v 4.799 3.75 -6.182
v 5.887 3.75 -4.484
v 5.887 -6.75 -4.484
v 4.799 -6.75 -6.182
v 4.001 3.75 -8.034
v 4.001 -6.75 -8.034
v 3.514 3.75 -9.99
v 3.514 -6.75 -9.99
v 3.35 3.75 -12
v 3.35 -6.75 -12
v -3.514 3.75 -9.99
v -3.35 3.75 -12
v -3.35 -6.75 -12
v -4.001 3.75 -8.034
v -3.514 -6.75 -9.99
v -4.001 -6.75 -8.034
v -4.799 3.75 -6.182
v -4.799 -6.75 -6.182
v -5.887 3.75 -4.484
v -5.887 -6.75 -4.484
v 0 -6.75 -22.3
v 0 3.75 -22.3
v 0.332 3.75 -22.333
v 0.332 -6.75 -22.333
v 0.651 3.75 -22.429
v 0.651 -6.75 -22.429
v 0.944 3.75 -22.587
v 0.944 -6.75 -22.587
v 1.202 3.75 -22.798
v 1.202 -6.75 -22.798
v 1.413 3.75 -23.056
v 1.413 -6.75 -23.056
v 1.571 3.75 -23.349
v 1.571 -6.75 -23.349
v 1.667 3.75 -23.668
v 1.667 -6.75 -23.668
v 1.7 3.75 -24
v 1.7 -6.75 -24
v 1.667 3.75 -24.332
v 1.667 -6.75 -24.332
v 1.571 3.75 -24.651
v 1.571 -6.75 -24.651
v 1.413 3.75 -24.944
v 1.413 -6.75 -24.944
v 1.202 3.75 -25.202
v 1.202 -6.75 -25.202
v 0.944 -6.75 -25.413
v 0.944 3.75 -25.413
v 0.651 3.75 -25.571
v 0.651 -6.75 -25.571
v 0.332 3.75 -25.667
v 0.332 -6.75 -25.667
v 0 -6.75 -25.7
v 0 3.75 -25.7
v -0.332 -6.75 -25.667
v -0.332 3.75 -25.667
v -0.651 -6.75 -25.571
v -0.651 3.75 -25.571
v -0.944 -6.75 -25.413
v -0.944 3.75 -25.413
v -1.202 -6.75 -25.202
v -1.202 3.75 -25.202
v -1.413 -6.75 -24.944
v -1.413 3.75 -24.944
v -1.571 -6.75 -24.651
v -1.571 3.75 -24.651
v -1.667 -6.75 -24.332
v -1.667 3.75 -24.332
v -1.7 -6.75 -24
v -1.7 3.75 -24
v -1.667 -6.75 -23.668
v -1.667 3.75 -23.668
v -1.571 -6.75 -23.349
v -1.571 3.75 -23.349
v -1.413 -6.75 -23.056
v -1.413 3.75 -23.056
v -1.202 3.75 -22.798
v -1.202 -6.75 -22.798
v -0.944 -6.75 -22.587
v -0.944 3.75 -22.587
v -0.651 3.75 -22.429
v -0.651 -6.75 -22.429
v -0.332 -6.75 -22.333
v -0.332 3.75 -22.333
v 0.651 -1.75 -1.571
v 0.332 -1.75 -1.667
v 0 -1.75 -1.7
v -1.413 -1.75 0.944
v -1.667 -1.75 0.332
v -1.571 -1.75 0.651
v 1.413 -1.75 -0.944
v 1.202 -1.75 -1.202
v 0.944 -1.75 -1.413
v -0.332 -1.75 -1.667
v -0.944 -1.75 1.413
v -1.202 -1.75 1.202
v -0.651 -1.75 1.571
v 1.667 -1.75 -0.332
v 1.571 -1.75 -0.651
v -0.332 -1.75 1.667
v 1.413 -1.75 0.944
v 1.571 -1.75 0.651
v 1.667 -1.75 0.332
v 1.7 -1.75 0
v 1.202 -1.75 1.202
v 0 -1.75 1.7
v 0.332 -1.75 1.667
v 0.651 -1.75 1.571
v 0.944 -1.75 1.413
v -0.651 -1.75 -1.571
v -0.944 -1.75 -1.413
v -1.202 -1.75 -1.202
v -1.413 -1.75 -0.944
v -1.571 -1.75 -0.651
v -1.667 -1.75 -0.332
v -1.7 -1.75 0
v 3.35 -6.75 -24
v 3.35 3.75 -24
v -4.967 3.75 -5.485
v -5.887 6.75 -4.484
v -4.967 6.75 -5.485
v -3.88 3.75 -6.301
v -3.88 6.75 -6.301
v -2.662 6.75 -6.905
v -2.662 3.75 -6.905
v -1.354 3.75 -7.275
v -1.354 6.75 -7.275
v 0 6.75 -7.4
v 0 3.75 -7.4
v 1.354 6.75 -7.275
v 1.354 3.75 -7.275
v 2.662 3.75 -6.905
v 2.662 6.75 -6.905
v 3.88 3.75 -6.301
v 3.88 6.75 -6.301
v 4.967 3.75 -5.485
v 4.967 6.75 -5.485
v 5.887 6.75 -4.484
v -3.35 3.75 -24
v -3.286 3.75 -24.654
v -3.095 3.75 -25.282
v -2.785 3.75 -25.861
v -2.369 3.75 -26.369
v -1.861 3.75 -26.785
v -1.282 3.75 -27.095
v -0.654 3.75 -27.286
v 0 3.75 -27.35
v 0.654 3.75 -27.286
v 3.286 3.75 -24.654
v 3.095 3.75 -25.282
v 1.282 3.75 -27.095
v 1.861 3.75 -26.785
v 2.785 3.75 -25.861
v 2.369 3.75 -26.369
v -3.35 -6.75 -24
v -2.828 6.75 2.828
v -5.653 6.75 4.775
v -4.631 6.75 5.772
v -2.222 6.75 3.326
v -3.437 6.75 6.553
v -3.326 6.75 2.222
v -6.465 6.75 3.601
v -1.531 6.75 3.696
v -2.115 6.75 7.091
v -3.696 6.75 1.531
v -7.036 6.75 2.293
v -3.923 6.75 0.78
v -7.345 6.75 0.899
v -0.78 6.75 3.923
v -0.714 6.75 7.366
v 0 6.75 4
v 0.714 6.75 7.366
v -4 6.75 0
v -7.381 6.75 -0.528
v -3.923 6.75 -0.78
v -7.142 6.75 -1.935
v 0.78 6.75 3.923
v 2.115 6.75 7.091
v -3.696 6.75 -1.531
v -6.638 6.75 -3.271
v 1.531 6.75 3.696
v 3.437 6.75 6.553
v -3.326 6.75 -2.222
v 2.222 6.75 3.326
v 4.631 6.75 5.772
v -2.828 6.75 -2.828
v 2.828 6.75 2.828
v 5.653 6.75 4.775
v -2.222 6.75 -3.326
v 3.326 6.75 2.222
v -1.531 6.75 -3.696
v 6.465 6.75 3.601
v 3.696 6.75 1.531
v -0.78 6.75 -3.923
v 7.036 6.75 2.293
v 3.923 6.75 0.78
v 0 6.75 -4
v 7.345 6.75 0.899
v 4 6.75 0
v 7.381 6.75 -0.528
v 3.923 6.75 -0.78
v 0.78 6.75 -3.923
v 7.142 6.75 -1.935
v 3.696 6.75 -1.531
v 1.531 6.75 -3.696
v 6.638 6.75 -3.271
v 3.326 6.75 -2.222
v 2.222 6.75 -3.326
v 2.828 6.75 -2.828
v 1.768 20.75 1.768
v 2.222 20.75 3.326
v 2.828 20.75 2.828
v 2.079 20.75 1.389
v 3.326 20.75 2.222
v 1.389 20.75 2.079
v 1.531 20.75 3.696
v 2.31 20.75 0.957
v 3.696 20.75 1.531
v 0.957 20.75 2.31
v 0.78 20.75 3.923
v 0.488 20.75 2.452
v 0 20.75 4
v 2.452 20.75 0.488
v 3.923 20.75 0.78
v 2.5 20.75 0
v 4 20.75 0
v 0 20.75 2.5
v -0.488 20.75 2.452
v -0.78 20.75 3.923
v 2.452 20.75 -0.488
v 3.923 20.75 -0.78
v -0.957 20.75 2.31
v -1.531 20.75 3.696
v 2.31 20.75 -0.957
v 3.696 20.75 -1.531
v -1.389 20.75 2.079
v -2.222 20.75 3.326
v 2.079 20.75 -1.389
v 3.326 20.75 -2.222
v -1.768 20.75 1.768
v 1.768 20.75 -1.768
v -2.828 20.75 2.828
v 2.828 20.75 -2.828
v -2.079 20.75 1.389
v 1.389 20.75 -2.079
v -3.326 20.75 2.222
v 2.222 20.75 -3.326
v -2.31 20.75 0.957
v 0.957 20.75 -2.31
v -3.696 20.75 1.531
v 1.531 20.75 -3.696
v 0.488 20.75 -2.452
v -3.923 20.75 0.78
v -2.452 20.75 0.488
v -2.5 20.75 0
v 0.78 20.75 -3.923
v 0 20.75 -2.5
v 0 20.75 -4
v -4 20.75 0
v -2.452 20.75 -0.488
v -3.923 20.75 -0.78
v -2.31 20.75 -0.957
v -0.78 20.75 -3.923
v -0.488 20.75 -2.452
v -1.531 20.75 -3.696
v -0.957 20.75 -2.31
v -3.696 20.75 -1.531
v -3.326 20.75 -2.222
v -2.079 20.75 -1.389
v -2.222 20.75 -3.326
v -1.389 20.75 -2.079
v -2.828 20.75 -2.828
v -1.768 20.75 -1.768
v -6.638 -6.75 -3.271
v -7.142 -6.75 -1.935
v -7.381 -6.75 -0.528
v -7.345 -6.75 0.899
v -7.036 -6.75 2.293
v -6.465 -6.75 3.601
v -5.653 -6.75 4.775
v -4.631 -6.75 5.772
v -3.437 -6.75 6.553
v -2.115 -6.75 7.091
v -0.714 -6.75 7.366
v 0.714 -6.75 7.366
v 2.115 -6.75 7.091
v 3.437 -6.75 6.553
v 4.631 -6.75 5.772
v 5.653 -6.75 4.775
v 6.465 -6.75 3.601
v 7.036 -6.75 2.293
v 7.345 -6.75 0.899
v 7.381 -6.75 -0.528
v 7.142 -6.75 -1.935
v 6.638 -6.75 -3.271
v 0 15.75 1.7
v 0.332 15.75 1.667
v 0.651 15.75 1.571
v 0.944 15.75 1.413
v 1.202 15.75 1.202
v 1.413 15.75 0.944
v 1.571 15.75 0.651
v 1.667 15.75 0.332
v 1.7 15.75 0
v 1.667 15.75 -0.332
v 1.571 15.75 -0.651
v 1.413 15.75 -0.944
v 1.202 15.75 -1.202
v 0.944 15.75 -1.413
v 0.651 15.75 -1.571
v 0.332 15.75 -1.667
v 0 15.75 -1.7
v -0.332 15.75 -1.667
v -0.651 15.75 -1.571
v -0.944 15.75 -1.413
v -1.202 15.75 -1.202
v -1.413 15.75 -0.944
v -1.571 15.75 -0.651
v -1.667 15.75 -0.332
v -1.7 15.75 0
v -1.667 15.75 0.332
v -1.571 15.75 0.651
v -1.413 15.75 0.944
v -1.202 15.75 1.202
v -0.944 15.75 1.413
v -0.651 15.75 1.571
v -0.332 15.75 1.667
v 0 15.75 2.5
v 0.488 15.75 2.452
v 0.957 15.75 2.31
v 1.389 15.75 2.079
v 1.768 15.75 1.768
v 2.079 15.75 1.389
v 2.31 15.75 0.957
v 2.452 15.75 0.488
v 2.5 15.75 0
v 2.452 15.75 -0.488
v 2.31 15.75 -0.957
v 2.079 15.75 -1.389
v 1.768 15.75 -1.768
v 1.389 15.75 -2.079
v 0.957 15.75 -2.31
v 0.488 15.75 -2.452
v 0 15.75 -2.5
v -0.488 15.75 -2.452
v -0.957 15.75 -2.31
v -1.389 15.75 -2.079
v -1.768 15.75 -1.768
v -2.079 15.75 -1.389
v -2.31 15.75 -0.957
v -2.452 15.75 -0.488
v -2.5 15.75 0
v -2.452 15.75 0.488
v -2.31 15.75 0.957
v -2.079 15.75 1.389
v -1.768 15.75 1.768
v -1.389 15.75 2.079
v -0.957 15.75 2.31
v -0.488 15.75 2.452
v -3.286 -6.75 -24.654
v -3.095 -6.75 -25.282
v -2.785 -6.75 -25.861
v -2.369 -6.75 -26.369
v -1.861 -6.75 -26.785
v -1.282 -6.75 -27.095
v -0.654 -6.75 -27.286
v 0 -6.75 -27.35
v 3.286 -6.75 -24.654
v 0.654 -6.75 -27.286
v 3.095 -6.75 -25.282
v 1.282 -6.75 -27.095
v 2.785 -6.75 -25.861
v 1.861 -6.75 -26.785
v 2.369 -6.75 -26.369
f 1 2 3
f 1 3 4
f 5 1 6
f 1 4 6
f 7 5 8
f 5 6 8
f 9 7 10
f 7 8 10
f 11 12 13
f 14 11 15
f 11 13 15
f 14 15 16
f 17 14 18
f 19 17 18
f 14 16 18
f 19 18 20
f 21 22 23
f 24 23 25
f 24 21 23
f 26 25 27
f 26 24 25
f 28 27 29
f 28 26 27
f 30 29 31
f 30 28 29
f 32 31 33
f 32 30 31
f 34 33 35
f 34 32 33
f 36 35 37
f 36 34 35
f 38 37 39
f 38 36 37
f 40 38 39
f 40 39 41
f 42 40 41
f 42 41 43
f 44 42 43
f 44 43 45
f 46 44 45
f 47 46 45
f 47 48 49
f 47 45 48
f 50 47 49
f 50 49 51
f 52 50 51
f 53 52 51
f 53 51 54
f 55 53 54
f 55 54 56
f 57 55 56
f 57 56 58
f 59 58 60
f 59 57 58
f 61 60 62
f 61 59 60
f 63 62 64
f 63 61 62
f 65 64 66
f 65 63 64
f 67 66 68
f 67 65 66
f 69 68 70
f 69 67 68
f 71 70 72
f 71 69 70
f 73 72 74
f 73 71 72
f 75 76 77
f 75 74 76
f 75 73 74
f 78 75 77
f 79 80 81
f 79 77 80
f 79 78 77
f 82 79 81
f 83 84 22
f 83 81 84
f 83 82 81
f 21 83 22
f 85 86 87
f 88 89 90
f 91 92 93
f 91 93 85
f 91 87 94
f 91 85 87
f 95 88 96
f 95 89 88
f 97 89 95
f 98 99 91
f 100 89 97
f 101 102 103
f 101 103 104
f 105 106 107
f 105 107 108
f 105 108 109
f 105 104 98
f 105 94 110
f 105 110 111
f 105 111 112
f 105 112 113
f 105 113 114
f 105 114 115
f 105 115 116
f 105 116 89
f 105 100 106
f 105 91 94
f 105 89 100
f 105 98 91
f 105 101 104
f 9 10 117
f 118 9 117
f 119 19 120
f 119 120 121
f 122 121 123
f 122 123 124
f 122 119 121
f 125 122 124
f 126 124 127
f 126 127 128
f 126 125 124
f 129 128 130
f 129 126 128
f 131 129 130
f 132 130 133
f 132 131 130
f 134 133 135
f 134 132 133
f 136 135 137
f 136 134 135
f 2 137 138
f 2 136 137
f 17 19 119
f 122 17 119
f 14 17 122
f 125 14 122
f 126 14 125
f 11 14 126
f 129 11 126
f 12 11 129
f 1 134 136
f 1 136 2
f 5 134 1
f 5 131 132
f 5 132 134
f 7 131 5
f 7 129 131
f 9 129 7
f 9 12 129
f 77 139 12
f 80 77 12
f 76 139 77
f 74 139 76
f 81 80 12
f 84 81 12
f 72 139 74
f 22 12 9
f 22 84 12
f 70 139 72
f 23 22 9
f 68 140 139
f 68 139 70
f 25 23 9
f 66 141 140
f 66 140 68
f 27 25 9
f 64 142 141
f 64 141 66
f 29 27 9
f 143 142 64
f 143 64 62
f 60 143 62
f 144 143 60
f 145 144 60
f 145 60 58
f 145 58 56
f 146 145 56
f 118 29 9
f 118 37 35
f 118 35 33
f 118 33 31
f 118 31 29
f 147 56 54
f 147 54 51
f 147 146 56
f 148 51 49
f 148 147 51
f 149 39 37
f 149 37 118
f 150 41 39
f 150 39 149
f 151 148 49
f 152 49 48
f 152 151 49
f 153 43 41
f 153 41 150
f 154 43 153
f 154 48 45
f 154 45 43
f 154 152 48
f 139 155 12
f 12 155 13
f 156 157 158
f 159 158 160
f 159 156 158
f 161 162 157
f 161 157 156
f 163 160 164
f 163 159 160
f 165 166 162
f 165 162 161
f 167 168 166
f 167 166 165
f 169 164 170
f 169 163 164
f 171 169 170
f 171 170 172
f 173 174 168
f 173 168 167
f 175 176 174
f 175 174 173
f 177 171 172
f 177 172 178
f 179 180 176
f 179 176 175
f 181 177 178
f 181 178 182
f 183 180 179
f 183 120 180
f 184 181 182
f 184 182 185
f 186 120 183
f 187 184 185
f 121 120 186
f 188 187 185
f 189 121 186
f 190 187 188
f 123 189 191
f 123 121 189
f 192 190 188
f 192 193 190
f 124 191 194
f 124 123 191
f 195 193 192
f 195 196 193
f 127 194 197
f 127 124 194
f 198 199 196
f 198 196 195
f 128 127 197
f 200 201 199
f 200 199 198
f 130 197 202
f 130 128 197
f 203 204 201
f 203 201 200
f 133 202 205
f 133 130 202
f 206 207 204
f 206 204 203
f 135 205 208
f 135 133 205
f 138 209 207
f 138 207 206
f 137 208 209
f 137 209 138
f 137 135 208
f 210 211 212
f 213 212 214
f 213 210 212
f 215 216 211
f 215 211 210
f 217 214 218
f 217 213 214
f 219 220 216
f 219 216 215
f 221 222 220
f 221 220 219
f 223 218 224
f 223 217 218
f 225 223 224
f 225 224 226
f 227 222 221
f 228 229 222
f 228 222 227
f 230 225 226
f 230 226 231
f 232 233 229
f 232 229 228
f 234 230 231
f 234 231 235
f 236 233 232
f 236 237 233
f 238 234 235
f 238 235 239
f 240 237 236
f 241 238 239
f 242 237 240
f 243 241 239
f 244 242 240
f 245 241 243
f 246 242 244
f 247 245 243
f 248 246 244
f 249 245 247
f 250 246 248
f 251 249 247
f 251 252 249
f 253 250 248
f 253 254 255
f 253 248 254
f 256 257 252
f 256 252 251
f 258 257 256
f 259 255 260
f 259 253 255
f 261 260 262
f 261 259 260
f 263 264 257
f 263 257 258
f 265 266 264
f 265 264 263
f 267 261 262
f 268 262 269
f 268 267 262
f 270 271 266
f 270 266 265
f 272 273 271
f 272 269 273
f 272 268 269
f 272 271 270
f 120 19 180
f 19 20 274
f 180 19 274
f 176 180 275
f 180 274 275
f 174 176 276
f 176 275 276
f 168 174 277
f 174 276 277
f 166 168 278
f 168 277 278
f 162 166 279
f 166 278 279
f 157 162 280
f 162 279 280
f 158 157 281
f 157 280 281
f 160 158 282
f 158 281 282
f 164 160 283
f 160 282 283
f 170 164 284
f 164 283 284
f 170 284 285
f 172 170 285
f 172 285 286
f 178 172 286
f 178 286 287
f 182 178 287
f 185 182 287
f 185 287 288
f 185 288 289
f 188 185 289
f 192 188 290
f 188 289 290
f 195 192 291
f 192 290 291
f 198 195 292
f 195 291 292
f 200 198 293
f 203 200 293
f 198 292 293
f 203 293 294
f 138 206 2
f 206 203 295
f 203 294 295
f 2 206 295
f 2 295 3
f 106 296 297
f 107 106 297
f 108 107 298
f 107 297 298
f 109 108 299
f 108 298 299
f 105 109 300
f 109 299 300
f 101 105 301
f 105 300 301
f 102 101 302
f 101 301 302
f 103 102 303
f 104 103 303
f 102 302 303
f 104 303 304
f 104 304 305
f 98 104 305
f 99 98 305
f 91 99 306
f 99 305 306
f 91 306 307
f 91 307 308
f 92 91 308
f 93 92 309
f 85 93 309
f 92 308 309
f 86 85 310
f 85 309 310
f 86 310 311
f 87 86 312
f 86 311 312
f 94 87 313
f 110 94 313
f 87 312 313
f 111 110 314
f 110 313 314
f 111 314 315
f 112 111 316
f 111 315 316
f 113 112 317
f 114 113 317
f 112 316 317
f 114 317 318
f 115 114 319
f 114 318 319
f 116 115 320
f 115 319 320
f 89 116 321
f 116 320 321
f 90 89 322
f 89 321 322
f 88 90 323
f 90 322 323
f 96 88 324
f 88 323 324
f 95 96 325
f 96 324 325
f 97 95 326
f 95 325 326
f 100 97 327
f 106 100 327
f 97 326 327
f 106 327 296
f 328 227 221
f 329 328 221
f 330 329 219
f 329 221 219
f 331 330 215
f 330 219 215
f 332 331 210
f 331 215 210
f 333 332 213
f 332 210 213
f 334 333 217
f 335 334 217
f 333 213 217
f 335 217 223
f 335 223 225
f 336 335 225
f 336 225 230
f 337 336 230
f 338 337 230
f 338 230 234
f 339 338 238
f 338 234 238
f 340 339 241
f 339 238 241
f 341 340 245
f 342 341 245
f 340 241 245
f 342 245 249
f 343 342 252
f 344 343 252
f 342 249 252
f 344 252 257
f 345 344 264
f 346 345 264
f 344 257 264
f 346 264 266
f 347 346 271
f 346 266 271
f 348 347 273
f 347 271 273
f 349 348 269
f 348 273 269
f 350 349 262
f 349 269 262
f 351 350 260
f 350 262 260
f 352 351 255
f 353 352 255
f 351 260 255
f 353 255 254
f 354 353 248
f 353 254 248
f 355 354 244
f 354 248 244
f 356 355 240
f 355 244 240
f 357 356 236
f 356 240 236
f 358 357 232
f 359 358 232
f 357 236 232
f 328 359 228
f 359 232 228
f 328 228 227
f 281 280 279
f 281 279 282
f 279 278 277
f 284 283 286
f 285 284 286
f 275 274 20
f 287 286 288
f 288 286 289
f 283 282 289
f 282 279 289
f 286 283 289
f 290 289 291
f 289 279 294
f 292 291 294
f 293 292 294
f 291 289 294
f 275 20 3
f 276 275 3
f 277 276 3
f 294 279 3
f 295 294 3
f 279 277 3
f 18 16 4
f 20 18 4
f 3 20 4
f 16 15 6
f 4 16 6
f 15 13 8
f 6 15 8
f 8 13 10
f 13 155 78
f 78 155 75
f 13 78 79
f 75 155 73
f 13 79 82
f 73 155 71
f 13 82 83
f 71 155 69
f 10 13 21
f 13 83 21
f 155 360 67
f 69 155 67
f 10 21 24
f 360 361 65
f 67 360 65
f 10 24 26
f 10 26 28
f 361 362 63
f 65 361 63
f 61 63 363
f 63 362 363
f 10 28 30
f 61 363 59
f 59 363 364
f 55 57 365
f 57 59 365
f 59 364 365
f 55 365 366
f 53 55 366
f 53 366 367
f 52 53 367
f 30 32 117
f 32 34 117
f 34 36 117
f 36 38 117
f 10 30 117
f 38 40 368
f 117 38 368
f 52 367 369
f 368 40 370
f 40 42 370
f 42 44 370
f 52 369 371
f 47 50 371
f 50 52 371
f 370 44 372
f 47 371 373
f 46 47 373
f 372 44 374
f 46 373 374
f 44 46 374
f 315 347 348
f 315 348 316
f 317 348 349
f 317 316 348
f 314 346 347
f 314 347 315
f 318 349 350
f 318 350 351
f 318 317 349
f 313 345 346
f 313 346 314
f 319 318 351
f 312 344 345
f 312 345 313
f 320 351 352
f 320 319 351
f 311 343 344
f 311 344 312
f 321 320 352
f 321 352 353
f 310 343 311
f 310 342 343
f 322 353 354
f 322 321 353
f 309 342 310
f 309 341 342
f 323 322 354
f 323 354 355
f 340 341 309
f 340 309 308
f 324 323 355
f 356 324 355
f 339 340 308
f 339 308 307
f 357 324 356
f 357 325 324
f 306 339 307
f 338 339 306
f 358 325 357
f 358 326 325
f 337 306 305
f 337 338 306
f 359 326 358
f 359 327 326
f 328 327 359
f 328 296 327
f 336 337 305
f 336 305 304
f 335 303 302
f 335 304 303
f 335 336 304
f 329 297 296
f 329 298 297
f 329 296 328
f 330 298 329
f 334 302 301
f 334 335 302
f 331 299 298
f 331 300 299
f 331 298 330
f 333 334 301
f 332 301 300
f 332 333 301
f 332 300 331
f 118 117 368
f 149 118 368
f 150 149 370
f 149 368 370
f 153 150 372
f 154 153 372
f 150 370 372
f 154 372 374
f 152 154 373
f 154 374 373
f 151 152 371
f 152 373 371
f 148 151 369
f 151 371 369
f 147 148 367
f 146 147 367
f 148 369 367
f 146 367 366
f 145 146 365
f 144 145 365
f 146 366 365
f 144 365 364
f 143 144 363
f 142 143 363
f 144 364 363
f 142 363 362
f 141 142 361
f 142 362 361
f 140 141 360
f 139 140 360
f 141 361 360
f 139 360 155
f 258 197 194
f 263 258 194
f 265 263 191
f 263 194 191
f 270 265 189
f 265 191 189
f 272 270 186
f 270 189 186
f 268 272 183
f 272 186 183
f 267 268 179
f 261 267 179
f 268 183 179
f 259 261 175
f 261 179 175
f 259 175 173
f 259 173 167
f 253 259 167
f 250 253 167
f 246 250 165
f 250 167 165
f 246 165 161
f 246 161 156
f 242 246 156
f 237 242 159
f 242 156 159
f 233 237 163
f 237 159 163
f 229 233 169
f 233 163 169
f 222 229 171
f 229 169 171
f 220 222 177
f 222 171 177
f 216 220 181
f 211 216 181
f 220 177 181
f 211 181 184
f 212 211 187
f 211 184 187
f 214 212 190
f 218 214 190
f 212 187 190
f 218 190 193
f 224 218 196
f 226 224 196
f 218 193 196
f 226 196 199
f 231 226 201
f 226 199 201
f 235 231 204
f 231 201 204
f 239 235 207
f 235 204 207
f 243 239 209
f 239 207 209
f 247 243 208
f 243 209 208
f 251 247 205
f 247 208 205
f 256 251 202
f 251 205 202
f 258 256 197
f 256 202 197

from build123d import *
from build123d.topology import SkipClean

# Parameters (mm, degrees)
BOSS_EXTRUDE1_DEPTH      = 6.75
BOSS_EXTRUDE1_DEPTH_BACK = 6.75
SKETCH1_R                = 1.7
SKETCH2_R                = 4
BOSS_EXTRUDE2_DEPTH      = 14
SKETCH3_R                = 2.5
CUT_EXTRUDE1_DEPTH       = 5
SKETCH4_R                = 1.7
CUT_EXTRUDE2_DEPTH       = 17.5
CUT_EXTRUDE4_START       = -3
CUT_EXTRUDE4_DEPTH       = 3


with BuildPart() as part:
    # Sketch1 → Boss-Extrude1 (new, two sides: drawn at the far end of the back side and taken through both)
    with BuildSketch(Plane(origin=(0, 0, 0), x_dir=(1, 0, 0), z_dir=(0, 1, 0)).offset(-BOSS_EXTRUDE1_DEPTH_BACK)):
        with BuildLine():
            Line((-3.35, 24), (-3.35, 12))
            ThreePointArc((-3.35, 12), (-4.001241595, 8.033856538), (-5.886575957, 4.484219386))
            ThreePointArc((-5.886575957, 4.484219386), (0, -7.4), (5.886575957, 4.484219386))
            ThreePointArc((5.886575957, 4.484219386), (4.001241595, 8.033856538), (3.35, 12))
            Line((3.35, 12), (3.35, 24))
            ThreePointArc((3.35, 24), (0, 27.35), (-3.35, 24))
        make_face()
        with Locations(Location((0, 24, 0), (0, 0, 270))):
            Circle(SKETCH1_R, mode=Mode.SUBTRACT)
    extrude(amount=BOSS_EXTRUDE1_DEPTH + BOSS_EXTRUDE1_DEPTH_BACK)

    # Sketch2 → Boss-Extrude2 (add)
    with BuildSketch(Plane(origin=(0, 6.75, 0), x_dir=(1, 0, 0), z_dir=(0, 1, 0))):
        with Locations(Location((0, 0, 0), (0, 0, 90))):
            Circle(SKETCH2_R)
    extrude(amount=BOSS_EXTRUDE2_DEPTH)

    # Sketch3 → Cut-Extrude1 (cut)
    with BuildSketch(Plane(origin=(0, 20.75, 0), x_dir=(1, 0, 0), z_dir=(0, 1, 0))):
        with Locations(Location((0, 0, 0), (0, 0, 270))):
            Circle(SKETCH3_R)
    extrude(amount=-CUT_EXTRUDE1_DEPTH, mode=Mode.SUBTRACT)

    # Sketch4 → Cut-Extrude2 (cut)
    with BuildSketch(Plane(origin=(0, 15.75, 0), x_dir=(1, 0, 0), z_dir=(0, 1, 0))):
        with Locations(Location((0, 0, 0), (0, 0, 270))):
            Circle(SKETCH4_R)
    extrude(amount=-CUT_EXTRUDE2_DEPTH, mode=Mode.SUBTRACT)

    # Sketch5 → Cut-Extrude4 (cut)
    with SkipClean():  # the faces are left unmerged after this step: merging them gives an invalid solid
        with BuildSketch(Plane(origin=(0, 6.75, 0), x_dir=(1, 0, 0), z_dir=(0, 1, 0)).offset(CUT_EXTRUDE4_START)):
            with BuildLine():
                Line((3.35, 12), (3.35, 24))
                ThreePointArc((3.35, 24), (0, 27.35), (-3.35, 24))
                Line((-3.35, 24), (-3.35, 12))
                ThreePointArc((-3.35, 12), (-4.001241595, 8.033856538), (-5.886575957, 4.484219386))
                ThreePointArc((-5.886575957, 4.484219386), (0, 7.4), (5.886575957, 4.484219386))
                ThreePointArc((5.886575957, 4.484219386), (4.001241595, 8.033856538), (3.35, 12))
            make_face()
        extrude(amount=CUT_EXTRUDE4_DEPTH, mode=Mode.SUBTRACT)


solid = part.part
